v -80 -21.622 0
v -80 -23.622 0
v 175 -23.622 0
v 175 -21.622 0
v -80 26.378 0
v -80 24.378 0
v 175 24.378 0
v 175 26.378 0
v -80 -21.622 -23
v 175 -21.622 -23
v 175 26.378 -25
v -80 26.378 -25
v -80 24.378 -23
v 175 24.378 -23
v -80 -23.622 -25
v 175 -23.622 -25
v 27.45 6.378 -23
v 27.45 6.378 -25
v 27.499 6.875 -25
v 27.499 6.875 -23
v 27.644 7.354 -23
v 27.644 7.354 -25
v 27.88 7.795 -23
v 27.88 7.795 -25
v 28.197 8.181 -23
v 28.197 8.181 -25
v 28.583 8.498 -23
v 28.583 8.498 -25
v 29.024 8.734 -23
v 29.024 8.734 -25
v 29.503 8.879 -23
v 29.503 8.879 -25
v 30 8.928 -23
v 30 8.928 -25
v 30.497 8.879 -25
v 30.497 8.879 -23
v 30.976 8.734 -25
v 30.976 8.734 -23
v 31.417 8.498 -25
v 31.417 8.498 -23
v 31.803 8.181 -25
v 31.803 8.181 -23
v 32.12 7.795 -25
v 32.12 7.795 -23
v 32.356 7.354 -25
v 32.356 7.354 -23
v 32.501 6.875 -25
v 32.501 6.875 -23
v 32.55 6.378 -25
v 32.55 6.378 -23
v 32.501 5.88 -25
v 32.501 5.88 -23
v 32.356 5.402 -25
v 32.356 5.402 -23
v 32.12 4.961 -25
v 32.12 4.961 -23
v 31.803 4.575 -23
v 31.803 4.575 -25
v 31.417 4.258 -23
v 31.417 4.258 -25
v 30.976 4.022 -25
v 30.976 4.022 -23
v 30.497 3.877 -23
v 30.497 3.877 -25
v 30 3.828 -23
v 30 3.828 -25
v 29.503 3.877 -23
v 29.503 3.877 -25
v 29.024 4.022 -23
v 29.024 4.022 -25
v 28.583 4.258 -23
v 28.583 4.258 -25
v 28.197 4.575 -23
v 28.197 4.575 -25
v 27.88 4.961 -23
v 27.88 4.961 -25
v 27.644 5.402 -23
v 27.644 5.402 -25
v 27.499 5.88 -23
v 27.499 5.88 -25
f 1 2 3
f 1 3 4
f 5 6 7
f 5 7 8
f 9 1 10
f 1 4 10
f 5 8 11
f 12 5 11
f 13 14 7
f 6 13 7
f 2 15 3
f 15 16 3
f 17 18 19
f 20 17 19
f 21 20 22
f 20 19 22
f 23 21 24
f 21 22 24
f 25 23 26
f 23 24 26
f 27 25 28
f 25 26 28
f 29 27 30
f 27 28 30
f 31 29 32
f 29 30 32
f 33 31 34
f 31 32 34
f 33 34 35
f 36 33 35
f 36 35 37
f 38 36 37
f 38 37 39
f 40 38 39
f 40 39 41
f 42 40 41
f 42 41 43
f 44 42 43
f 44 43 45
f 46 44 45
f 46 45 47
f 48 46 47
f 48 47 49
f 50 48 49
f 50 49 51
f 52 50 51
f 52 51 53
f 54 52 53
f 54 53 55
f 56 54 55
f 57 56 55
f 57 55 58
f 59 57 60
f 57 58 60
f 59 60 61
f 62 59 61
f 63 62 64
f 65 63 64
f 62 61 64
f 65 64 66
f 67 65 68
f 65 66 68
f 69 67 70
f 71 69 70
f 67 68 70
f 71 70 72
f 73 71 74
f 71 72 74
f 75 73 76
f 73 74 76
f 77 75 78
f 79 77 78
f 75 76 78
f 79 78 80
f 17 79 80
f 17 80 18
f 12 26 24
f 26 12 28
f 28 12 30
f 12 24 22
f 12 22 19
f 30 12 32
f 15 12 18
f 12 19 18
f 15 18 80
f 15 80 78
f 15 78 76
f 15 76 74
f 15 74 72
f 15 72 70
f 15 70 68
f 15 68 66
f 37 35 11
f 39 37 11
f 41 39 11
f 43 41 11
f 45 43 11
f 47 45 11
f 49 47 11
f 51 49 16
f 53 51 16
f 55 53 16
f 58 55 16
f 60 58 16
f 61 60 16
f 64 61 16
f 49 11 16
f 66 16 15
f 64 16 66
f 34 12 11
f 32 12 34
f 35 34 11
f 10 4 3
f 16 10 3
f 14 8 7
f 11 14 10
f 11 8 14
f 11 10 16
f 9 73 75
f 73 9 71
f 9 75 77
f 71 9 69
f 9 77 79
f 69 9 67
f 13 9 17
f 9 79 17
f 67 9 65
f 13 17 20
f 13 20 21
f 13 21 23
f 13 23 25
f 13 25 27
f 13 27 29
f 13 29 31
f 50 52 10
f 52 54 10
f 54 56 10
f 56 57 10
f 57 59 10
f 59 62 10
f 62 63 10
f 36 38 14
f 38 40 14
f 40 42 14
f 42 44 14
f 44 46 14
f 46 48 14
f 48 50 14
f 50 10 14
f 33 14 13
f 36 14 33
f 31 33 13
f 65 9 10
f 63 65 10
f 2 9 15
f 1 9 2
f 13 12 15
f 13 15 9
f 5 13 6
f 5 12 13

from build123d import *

# Parameters (mm, degrees)
BOSS_EXTRUDE1_DEPTH = 175
SKETCH2_R           = 2.55
CUT_EXTRUDE1_DEPTH  = 380
BOSS_EXTRUDE2_DEPTH = 80


with BuildPart() as part:
    # Sketch1 → Boss-Extrude1 (new body)
    with BuildSketch(Plane(origin=(0, 0, 0), x_dir=(0, 0, -1), z_dir=(1, 0, 0))):
        Polygon((0, 24.377952756), (23, 24.377952756), (23, -21.622047244), (0, -21.622047244), (0, -23.622047244), (25, -23.622047244), (25, 26.377952756), (0, 26.377952756), align=None)
    extrude(amount=BOSS_EXTRUDE1_DEPTH)

    # Sketch2 → Cut-Extrude1 (cut)
    with BuildSketch(Plane(origin=(0, 0, -25), x_dir=(-1, 0, 0), z_dir=(0, 0, -1))):
        with Locations((-30, 6.377952756)):
            Circle(SKETCH2_R)
    extrude(amount=-CUT_EXTRUDE1_DEPTH, mode=Mode.SUBTRACT)

    # Sketch3 → Boss-Extrude2 (add)
    with BuildSketch(Plane.ZY):
        Polygon((0, 26.377952756), (-25, 26.377952756), (-25, -23.622047244), (0, -23.622047244), (0, -21.622047244), (-23, -21.622047244), (-23, 24.377952756), (0, 24.377952756), align=None)
    extrude(amount=BOSS_EXTRUDE2_DEPTH)


solid = part.part
